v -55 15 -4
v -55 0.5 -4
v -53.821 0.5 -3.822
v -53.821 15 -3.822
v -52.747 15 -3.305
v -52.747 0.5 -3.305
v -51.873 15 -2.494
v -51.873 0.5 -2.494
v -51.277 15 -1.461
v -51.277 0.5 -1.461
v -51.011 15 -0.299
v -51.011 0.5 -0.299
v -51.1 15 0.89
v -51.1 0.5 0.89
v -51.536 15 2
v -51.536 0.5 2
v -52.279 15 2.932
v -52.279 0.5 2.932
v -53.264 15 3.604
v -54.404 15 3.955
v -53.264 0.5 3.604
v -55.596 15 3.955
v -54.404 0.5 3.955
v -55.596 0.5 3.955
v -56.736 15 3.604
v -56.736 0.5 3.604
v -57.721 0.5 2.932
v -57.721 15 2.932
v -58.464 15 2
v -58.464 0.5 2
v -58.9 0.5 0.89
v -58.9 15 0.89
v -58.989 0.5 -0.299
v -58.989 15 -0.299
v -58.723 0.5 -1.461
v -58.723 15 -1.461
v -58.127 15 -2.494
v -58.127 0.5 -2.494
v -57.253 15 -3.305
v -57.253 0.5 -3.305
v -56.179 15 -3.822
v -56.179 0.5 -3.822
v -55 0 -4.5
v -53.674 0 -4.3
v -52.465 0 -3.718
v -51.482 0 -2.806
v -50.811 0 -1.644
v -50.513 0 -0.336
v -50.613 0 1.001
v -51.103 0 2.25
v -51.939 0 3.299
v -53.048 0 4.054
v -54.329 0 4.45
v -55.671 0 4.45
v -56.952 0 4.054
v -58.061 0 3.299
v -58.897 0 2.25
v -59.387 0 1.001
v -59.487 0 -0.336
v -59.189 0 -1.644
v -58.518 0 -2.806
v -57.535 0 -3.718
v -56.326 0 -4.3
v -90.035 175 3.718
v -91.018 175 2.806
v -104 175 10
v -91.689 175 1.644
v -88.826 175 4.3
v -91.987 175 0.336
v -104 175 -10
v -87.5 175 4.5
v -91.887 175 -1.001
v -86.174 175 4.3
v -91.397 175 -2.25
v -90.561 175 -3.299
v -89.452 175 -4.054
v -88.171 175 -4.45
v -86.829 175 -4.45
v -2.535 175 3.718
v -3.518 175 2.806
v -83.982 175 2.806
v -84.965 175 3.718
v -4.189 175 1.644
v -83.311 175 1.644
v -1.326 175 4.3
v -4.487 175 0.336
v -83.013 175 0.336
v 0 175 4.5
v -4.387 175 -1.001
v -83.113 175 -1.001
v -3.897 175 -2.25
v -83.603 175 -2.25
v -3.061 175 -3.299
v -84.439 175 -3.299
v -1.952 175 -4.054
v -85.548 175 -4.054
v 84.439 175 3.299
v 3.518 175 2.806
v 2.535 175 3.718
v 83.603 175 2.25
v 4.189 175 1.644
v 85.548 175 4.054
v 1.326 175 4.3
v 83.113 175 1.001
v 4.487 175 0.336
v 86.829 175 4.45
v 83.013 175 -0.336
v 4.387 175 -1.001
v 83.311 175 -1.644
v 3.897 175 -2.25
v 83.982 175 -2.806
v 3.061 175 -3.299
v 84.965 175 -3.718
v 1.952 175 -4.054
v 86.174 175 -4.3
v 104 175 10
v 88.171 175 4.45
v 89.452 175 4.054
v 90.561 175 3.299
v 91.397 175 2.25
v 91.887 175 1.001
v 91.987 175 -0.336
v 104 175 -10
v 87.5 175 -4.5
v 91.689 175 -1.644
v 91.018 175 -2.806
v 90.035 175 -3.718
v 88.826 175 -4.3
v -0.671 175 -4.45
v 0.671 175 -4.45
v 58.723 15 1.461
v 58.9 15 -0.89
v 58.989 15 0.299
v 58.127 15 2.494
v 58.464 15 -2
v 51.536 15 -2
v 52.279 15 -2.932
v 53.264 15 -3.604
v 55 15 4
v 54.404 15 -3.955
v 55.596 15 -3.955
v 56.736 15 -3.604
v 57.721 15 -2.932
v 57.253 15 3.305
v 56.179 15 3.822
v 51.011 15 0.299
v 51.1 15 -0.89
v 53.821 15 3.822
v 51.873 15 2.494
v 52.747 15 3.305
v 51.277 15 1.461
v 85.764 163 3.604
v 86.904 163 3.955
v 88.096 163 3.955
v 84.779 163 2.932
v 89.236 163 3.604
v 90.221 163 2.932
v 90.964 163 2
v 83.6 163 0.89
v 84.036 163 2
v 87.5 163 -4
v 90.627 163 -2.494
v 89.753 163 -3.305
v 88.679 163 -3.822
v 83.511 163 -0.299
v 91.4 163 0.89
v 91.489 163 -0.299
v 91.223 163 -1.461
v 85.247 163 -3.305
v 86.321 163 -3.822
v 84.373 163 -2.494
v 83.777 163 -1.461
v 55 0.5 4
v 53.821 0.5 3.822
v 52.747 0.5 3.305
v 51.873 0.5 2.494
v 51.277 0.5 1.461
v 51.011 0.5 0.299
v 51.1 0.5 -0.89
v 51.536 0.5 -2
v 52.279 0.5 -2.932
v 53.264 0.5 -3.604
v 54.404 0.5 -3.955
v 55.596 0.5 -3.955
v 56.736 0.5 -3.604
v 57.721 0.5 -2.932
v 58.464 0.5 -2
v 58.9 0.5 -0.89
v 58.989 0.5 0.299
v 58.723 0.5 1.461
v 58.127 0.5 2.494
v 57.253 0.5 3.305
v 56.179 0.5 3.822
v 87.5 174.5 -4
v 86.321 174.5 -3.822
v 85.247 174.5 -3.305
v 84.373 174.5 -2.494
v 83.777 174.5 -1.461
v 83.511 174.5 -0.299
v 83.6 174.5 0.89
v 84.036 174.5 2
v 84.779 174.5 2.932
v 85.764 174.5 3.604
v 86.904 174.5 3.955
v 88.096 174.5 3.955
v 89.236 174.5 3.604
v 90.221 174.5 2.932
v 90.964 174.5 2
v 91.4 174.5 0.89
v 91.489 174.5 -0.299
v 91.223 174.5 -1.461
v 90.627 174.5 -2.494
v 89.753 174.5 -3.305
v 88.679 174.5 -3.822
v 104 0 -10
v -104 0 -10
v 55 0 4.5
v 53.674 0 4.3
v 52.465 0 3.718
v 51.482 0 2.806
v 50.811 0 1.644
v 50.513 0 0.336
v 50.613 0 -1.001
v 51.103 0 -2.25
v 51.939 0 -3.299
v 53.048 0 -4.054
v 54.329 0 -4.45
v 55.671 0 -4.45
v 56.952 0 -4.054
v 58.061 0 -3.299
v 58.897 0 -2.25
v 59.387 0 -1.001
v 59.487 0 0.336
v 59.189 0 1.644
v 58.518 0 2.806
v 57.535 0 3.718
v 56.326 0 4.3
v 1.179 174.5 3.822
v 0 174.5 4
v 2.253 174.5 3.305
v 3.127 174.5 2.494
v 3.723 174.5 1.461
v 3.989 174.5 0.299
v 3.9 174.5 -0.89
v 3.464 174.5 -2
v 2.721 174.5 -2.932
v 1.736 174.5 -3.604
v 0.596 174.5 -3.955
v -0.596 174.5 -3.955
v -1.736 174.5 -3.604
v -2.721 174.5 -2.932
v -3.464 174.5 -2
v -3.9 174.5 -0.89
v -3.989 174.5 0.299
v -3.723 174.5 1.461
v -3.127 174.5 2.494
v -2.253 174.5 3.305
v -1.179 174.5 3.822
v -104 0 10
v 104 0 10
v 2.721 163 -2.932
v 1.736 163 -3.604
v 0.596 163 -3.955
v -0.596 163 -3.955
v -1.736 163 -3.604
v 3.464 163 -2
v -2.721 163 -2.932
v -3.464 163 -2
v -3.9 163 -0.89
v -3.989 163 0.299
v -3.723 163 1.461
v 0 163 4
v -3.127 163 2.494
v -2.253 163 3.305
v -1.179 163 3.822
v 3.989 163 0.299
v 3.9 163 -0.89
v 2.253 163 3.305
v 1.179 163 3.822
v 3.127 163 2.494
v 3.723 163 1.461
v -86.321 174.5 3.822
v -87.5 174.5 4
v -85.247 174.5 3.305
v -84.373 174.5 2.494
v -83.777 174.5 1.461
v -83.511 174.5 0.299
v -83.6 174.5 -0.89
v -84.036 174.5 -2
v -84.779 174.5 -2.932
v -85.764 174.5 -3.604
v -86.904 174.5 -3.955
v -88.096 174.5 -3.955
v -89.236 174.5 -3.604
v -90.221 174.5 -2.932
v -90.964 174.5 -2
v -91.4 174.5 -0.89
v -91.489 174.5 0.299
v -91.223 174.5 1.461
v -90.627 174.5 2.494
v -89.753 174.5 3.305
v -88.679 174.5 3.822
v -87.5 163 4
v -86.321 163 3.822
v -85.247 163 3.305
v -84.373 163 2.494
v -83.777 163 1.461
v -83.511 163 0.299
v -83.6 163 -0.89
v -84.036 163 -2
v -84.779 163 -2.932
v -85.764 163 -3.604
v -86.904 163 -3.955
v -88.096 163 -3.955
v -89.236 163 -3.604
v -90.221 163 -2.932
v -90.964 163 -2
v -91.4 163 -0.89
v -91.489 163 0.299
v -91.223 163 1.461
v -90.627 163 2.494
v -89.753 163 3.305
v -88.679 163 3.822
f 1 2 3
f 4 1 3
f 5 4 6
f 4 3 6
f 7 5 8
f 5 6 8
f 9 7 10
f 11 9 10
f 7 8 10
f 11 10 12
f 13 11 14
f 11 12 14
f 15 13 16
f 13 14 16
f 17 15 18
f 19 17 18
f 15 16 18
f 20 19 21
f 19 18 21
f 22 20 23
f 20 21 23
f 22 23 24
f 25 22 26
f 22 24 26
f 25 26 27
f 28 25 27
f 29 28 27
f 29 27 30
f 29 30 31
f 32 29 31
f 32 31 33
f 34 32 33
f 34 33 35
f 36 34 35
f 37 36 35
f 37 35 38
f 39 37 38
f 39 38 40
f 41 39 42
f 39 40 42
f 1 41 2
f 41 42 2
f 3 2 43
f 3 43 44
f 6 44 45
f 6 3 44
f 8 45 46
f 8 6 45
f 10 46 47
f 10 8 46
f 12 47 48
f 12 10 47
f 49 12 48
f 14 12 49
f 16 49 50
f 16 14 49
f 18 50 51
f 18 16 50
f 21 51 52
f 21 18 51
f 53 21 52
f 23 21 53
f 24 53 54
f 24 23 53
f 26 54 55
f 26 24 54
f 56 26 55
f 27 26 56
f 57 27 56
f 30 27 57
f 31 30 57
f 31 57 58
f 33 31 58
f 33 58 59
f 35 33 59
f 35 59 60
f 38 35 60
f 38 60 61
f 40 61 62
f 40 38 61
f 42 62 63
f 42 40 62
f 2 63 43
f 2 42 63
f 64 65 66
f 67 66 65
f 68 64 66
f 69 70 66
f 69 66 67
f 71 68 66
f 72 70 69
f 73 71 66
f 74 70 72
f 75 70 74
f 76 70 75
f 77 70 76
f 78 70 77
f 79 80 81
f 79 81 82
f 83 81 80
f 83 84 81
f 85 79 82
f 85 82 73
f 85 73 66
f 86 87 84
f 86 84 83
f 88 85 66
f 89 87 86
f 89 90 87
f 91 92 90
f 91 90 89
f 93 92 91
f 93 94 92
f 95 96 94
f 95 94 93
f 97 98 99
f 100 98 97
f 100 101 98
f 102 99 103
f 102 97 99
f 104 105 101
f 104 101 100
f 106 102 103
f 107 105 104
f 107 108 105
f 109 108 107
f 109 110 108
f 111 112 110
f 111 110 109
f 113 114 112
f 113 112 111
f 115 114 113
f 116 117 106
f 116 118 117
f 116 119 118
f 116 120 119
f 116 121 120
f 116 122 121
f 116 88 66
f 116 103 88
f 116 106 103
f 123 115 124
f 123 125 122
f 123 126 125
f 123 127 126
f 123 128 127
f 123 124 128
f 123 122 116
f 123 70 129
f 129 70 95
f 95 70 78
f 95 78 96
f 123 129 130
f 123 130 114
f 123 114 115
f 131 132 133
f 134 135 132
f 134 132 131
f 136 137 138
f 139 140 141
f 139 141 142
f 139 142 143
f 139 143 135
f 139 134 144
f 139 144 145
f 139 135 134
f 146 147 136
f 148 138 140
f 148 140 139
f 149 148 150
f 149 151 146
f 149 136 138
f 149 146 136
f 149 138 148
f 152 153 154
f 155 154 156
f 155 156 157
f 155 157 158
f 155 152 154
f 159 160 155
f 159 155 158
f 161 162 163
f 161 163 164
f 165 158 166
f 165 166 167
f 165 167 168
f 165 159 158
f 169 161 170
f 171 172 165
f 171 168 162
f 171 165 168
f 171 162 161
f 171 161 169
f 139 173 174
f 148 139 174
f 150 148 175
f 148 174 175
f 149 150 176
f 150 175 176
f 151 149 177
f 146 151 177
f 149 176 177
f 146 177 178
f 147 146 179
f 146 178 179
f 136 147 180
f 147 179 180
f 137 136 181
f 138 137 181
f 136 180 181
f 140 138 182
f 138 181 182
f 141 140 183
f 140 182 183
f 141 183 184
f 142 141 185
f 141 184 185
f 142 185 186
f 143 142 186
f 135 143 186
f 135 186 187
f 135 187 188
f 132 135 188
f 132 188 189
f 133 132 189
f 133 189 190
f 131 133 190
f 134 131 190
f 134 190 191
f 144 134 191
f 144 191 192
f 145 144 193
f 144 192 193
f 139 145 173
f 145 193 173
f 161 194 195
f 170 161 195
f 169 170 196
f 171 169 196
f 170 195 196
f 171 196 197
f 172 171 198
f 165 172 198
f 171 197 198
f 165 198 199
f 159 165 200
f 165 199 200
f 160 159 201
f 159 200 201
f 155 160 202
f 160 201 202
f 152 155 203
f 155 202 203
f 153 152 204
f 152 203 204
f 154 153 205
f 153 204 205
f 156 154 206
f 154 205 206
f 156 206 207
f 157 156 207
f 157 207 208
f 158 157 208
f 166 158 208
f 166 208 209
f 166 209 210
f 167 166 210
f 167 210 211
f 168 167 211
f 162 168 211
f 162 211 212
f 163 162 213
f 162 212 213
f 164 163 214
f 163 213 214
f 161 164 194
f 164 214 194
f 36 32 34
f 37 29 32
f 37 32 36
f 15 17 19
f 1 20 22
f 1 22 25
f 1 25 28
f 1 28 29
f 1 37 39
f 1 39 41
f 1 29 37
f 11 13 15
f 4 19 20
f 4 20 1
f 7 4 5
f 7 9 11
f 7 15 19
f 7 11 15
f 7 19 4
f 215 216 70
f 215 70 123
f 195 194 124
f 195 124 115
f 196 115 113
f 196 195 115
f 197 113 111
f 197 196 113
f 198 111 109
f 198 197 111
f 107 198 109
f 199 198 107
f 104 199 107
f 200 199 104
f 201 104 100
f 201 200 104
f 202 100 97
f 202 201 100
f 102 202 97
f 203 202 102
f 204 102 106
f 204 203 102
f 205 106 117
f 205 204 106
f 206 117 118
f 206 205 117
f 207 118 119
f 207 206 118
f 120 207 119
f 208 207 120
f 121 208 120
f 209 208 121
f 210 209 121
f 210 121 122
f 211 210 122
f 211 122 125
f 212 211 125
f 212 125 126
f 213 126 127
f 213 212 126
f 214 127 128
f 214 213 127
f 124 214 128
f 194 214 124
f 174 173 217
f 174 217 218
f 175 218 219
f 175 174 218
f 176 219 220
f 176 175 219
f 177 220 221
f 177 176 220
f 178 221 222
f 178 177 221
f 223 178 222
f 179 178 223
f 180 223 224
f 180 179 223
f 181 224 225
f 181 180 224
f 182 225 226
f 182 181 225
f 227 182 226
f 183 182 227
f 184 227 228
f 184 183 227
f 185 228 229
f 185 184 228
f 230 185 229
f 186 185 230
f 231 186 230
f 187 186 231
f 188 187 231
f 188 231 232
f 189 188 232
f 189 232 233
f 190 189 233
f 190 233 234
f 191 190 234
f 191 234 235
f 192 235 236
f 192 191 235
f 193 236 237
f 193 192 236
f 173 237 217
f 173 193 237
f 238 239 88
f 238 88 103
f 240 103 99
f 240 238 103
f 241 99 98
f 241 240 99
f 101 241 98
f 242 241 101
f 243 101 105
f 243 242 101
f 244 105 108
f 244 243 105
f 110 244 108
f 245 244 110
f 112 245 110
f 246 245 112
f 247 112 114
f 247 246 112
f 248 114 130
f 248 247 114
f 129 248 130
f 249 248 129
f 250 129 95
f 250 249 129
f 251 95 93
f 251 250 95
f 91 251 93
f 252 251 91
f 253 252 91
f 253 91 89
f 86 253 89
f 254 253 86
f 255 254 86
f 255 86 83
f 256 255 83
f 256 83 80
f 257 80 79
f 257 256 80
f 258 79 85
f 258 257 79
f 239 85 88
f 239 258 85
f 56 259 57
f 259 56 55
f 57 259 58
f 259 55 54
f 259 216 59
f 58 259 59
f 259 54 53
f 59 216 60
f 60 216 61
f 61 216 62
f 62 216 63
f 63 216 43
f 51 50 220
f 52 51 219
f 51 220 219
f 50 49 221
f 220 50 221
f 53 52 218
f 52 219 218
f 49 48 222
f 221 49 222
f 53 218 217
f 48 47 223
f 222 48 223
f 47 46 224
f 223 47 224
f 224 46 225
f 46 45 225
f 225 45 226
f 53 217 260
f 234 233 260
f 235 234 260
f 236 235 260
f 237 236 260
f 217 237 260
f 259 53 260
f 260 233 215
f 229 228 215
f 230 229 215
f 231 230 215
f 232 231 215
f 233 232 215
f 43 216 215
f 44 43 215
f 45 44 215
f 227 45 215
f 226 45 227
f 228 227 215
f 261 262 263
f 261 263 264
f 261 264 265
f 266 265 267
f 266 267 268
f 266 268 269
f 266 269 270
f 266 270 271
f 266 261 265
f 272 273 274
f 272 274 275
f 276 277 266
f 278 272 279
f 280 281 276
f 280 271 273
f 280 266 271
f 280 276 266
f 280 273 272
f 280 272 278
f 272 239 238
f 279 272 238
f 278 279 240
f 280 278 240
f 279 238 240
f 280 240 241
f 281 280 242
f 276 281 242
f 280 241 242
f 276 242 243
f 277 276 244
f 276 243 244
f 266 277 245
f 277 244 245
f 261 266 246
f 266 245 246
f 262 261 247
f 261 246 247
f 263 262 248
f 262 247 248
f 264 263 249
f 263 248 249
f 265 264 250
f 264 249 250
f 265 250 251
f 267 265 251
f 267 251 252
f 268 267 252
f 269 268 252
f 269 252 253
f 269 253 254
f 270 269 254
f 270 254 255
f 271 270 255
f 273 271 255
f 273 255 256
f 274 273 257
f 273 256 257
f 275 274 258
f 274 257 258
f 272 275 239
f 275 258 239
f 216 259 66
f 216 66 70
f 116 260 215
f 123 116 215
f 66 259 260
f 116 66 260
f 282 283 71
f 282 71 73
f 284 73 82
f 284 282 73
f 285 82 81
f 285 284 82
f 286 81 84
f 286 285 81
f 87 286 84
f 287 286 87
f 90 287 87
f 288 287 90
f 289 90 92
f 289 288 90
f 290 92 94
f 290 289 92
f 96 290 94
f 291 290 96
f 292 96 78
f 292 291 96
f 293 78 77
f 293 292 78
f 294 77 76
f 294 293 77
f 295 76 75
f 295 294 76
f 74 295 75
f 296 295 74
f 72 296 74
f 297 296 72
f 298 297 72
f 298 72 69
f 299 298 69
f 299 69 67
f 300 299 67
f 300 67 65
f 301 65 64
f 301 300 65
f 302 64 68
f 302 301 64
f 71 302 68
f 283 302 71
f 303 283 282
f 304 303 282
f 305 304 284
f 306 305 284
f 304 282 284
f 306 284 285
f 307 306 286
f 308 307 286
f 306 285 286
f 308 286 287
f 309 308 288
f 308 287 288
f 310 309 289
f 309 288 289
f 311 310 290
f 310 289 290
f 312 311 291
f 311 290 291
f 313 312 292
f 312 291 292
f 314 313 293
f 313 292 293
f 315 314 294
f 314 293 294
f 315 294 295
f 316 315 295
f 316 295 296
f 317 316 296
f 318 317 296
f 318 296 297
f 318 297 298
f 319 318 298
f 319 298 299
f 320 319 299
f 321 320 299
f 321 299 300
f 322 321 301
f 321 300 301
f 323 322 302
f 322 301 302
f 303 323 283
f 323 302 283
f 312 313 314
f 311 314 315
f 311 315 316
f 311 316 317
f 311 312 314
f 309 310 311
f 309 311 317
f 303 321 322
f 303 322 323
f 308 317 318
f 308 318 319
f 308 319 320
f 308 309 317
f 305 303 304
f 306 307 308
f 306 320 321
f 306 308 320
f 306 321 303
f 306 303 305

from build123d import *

# Parameters (mm, degrees)
SKETCH1_W           = 208
SKETCH1_H           = 20
BOSS_EXTRUDE1_DEPTH = 175
SKETCH2_R           = 4
CUT_EXTRUDE1_DEPTH  = 12
SKETCH3_R           = 4
CUT_EXTRUDE2_DEPTH  = 15
CHAMFER1_SIZE       = 0.5


with BuildPart() as part:
    # Sketch1 → Boss-Extrude1 (new body)
    with BuildSketch(Plane(origin=(0, 0, -58), x_dir=(1, 0, 0), z_dir=(0, 1, 0))):
        with Locations((0, -58)):
            Rectangle(SKETCH1_W, SKETCH1_H)
    extrude(amount=BOSS_EXTRUDE1_DEPTH)

    # Sketch2 → Cut-Extrude1 (cut)
    with BuildSketch(Plane(origin=(0, 175, 0), x_dir=(1, 0, 0), z_dir=(0, 1, 0))):
        with Locations(Location((0, 0, 0), (0, 0, 270))):
            Circle(SKETCH2_R)
        with Locations(Location((-87.5, 0, 0), (0, 0, 270))):
            Circle(SKETCH2_R)
        with Locations(Location((87.5, 0, 0), (0, 0, 90))):
            Circle(SKETCH2_R)
    extrude(amount=-CUT_EXTRUDE1_DEPTH, mode=Mode.SUBTRACT)

    # Sketch3 → Cut-Extrude2 (cut)
    with BuildSketch(Plane.XZ):
        with Locations(Location((-55, 0, 0), (0, 0, 270))):
            Circle(SKETCH3_R)
        with Locations(Location((55, 0, 0), (0, 0, 90))):
            Circle(SKETCH3_R)
    extrude(amount=-CUT_EXTRUDE2_DEPTH, mode=Mode.SUBTRACT)

    # Chamfer1
    chamfer1_edges = [part.edges().sort_by_distance(p)[0] for p in [
        (87.5, 175, 4),
        (-87.5, 175, -4),
        (0, 175, -4),
        (-55, 0, 4),
        (55, 0, -4),
    ]]
    chamfer(chamfer1_edges, length=CHAMFER1_SIZE)


solid = part.part
